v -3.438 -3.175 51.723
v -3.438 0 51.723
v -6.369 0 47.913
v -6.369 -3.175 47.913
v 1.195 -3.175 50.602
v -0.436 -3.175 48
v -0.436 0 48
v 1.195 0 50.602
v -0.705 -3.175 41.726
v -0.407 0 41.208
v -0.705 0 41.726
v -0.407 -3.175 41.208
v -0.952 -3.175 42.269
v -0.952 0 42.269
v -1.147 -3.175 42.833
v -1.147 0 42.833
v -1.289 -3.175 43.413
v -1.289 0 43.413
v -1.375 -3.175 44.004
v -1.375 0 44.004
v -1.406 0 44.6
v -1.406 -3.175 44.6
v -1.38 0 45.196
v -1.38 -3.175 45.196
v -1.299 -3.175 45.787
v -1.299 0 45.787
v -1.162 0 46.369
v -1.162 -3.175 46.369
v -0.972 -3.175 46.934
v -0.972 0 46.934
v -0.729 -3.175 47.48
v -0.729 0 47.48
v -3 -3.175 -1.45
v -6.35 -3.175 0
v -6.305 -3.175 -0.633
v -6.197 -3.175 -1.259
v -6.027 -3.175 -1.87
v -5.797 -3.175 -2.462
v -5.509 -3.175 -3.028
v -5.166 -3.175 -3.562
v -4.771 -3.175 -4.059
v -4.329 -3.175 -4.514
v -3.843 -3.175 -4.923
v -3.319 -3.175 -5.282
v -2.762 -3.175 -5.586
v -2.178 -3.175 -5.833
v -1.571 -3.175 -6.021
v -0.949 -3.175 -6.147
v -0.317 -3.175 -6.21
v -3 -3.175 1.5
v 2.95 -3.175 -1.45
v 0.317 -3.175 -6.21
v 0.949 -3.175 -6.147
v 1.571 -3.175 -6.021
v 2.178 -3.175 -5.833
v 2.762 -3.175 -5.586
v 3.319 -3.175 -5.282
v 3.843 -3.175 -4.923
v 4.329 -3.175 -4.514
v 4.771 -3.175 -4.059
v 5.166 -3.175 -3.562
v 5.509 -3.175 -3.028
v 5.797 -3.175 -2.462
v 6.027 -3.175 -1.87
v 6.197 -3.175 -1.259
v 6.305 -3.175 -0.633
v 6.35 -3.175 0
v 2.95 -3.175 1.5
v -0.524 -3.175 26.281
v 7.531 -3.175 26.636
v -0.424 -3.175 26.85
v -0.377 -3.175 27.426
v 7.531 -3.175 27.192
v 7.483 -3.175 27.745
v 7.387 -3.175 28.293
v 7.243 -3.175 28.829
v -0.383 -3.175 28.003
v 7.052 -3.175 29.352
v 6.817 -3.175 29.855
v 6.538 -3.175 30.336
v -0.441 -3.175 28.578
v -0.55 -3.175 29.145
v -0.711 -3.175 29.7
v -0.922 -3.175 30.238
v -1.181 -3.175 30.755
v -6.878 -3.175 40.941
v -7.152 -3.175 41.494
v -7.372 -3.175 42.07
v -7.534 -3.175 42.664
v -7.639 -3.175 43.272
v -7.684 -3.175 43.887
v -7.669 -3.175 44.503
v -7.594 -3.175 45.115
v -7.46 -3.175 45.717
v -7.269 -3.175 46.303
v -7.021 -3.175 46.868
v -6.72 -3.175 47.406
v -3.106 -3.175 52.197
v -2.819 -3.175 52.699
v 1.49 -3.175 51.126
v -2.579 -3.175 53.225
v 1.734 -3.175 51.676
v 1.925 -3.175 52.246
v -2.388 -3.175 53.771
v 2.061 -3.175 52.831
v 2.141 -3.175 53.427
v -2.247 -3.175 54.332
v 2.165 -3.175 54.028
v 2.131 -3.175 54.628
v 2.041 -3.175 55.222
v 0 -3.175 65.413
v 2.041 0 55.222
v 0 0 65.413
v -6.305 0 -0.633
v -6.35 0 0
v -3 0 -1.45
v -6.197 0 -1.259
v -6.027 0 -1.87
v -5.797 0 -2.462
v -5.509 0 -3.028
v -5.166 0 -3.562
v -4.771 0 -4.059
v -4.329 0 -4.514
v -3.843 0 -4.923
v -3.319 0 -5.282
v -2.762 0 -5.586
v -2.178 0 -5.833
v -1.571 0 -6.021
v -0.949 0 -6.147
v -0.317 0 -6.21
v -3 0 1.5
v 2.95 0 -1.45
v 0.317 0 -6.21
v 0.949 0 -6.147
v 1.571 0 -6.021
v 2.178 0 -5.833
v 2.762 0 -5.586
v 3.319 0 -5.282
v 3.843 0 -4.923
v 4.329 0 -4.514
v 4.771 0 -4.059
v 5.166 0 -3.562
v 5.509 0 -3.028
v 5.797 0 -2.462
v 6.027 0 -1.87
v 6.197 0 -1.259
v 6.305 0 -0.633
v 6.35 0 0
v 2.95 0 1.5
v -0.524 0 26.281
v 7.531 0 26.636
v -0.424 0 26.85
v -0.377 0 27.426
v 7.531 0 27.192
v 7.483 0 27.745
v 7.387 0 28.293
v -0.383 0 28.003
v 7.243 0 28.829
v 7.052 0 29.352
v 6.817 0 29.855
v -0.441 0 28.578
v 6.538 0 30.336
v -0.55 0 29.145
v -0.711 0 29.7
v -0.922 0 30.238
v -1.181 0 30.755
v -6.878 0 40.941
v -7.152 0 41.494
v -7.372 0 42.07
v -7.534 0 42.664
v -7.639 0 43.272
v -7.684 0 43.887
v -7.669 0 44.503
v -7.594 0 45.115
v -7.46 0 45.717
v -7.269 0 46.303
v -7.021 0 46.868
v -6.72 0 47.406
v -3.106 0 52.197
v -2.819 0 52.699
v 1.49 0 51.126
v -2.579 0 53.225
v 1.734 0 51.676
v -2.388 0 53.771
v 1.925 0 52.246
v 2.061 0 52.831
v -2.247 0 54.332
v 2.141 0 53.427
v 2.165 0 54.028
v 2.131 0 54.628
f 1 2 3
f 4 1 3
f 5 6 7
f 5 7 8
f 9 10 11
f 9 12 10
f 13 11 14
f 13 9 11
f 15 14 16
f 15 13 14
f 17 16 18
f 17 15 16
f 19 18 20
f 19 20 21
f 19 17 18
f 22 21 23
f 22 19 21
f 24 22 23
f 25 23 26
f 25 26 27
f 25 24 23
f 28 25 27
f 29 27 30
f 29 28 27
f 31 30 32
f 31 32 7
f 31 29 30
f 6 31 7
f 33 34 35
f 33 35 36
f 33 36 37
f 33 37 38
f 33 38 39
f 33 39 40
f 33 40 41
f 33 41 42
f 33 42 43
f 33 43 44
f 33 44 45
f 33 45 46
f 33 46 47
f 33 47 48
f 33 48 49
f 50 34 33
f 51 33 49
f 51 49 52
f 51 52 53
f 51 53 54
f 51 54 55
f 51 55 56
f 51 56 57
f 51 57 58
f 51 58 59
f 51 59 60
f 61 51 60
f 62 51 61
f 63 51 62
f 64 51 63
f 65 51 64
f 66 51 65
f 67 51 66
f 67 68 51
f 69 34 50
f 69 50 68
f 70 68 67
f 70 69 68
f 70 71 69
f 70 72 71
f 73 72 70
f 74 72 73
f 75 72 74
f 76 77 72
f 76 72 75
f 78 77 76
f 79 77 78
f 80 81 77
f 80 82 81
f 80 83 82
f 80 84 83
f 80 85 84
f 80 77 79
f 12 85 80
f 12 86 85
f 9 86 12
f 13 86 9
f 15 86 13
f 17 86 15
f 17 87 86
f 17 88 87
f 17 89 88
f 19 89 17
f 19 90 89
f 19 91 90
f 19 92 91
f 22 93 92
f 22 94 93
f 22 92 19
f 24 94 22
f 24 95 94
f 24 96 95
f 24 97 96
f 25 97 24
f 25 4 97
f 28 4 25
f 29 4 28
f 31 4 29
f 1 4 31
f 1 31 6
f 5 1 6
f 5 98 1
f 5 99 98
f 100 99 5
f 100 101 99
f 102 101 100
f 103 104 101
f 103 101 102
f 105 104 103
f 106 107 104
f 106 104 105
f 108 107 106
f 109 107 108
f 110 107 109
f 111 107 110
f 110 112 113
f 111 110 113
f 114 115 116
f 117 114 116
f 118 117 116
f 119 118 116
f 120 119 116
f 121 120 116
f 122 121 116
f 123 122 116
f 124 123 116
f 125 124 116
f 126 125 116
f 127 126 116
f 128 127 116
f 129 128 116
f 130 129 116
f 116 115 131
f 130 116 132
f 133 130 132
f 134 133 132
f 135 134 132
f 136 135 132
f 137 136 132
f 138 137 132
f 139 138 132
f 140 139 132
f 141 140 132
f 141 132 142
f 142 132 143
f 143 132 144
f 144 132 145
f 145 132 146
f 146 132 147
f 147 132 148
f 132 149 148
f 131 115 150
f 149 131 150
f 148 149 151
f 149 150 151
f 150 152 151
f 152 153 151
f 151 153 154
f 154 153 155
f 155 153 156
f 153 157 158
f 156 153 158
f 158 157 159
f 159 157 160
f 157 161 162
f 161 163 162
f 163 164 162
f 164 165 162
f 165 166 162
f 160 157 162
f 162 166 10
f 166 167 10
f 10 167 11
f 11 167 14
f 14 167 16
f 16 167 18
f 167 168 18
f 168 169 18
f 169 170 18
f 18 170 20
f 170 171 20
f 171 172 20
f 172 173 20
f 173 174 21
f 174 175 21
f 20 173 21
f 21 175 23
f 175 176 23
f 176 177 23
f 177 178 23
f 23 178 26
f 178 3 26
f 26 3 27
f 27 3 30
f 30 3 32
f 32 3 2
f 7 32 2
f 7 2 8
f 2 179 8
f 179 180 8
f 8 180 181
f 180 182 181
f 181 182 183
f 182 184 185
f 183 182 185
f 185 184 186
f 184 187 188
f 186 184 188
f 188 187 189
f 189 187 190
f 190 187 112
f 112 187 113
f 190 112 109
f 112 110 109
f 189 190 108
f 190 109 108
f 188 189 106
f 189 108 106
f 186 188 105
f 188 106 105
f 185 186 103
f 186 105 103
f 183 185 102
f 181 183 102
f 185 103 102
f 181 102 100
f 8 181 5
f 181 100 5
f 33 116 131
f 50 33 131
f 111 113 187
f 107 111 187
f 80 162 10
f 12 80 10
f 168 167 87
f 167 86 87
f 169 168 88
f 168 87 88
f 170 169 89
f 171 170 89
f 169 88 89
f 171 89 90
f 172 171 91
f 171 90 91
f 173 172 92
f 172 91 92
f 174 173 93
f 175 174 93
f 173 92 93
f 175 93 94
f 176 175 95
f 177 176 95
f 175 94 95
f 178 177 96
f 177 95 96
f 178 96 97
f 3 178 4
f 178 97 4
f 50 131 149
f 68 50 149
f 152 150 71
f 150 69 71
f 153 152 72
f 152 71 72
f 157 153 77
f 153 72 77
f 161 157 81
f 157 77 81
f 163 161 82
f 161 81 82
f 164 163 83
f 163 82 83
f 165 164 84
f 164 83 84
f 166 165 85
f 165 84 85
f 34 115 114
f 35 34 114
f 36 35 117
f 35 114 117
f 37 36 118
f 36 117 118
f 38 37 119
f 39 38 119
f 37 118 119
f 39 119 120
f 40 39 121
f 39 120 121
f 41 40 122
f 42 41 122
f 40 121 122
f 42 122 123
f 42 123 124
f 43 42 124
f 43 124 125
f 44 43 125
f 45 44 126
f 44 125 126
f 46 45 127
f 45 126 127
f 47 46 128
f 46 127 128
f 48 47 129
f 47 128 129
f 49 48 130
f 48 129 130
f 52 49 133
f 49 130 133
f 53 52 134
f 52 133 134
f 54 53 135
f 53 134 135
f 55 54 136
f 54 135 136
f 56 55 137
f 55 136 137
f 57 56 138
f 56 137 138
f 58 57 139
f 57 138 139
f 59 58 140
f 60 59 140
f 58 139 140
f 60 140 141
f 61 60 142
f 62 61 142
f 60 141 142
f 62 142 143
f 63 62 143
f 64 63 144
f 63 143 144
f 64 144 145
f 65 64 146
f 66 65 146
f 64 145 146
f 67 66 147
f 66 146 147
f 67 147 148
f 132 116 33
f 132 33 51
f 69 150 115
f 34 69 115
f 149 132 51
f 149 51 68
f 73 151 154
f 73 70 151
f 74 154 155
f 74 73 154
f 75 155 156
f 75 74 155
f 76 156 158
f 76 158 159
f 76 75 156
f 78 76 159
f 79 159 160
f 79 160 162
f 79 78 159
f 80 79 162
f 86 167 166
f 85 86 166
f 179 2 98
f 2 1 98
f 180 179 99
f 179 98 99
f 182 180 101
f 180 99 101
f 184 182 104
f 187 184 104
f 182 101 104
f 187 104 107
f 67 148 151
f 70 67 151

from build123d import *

# Parameters (mm, degrees)
F0_W     = 5.95
F0_H     = 2.95
F1_DEPTH = 3.175
F2_R     = 6.35


with BuildPart() as f1:
    # F0 (on Front) → F1 (new body)
    with BuildSketch(Plane.XZ):
        with BuildLine():
            Line((0, 28.642999), (-6.35, 0))
            ThreePointArc((-6.35, 0), (0, -6.217982), (6.35, 0))
            Line((6.35, 0), (7.62, 28.642999))
            Line((7.62, 28.642999), (-2.570709, 44.594768))
            Line((-2.570709, 44.594768), (2.537907, 52.743887))
            Line((2.537907, 52.743887), (0, 65.412782))
            Line((0, 65.412782), (-2.54, 52.88969))
            Line((-2.54, 52.88969), (-8.920709, 44.594768))
            Line((-8.920709, 44.594768), (0, 28.642999))
        make_face()
        with Locations((-0.025, 0.025)):
            Rectangle(F0_W, F0_H, mode=Mode.SUBTRACT)
    extrude(amount=F1_DEPTH)

    # F2
    f2_edges = [f1.edges().sort_by_distance(p)[0] for p in [
        (2.537907, -1.5875, 52.743887),
        (-2.570709, -1.5875, 44.594768),
        (7.62, -1.5875, 28.642999),
        (0, -1.5875, 28.642999),
        (-8.920709, -1.5875, 44.594768),
        (-2.54, -1.5875, 52.88969),
    ]]
    fillet(f2_edges, radius=F2_R)


solid = f1.part
